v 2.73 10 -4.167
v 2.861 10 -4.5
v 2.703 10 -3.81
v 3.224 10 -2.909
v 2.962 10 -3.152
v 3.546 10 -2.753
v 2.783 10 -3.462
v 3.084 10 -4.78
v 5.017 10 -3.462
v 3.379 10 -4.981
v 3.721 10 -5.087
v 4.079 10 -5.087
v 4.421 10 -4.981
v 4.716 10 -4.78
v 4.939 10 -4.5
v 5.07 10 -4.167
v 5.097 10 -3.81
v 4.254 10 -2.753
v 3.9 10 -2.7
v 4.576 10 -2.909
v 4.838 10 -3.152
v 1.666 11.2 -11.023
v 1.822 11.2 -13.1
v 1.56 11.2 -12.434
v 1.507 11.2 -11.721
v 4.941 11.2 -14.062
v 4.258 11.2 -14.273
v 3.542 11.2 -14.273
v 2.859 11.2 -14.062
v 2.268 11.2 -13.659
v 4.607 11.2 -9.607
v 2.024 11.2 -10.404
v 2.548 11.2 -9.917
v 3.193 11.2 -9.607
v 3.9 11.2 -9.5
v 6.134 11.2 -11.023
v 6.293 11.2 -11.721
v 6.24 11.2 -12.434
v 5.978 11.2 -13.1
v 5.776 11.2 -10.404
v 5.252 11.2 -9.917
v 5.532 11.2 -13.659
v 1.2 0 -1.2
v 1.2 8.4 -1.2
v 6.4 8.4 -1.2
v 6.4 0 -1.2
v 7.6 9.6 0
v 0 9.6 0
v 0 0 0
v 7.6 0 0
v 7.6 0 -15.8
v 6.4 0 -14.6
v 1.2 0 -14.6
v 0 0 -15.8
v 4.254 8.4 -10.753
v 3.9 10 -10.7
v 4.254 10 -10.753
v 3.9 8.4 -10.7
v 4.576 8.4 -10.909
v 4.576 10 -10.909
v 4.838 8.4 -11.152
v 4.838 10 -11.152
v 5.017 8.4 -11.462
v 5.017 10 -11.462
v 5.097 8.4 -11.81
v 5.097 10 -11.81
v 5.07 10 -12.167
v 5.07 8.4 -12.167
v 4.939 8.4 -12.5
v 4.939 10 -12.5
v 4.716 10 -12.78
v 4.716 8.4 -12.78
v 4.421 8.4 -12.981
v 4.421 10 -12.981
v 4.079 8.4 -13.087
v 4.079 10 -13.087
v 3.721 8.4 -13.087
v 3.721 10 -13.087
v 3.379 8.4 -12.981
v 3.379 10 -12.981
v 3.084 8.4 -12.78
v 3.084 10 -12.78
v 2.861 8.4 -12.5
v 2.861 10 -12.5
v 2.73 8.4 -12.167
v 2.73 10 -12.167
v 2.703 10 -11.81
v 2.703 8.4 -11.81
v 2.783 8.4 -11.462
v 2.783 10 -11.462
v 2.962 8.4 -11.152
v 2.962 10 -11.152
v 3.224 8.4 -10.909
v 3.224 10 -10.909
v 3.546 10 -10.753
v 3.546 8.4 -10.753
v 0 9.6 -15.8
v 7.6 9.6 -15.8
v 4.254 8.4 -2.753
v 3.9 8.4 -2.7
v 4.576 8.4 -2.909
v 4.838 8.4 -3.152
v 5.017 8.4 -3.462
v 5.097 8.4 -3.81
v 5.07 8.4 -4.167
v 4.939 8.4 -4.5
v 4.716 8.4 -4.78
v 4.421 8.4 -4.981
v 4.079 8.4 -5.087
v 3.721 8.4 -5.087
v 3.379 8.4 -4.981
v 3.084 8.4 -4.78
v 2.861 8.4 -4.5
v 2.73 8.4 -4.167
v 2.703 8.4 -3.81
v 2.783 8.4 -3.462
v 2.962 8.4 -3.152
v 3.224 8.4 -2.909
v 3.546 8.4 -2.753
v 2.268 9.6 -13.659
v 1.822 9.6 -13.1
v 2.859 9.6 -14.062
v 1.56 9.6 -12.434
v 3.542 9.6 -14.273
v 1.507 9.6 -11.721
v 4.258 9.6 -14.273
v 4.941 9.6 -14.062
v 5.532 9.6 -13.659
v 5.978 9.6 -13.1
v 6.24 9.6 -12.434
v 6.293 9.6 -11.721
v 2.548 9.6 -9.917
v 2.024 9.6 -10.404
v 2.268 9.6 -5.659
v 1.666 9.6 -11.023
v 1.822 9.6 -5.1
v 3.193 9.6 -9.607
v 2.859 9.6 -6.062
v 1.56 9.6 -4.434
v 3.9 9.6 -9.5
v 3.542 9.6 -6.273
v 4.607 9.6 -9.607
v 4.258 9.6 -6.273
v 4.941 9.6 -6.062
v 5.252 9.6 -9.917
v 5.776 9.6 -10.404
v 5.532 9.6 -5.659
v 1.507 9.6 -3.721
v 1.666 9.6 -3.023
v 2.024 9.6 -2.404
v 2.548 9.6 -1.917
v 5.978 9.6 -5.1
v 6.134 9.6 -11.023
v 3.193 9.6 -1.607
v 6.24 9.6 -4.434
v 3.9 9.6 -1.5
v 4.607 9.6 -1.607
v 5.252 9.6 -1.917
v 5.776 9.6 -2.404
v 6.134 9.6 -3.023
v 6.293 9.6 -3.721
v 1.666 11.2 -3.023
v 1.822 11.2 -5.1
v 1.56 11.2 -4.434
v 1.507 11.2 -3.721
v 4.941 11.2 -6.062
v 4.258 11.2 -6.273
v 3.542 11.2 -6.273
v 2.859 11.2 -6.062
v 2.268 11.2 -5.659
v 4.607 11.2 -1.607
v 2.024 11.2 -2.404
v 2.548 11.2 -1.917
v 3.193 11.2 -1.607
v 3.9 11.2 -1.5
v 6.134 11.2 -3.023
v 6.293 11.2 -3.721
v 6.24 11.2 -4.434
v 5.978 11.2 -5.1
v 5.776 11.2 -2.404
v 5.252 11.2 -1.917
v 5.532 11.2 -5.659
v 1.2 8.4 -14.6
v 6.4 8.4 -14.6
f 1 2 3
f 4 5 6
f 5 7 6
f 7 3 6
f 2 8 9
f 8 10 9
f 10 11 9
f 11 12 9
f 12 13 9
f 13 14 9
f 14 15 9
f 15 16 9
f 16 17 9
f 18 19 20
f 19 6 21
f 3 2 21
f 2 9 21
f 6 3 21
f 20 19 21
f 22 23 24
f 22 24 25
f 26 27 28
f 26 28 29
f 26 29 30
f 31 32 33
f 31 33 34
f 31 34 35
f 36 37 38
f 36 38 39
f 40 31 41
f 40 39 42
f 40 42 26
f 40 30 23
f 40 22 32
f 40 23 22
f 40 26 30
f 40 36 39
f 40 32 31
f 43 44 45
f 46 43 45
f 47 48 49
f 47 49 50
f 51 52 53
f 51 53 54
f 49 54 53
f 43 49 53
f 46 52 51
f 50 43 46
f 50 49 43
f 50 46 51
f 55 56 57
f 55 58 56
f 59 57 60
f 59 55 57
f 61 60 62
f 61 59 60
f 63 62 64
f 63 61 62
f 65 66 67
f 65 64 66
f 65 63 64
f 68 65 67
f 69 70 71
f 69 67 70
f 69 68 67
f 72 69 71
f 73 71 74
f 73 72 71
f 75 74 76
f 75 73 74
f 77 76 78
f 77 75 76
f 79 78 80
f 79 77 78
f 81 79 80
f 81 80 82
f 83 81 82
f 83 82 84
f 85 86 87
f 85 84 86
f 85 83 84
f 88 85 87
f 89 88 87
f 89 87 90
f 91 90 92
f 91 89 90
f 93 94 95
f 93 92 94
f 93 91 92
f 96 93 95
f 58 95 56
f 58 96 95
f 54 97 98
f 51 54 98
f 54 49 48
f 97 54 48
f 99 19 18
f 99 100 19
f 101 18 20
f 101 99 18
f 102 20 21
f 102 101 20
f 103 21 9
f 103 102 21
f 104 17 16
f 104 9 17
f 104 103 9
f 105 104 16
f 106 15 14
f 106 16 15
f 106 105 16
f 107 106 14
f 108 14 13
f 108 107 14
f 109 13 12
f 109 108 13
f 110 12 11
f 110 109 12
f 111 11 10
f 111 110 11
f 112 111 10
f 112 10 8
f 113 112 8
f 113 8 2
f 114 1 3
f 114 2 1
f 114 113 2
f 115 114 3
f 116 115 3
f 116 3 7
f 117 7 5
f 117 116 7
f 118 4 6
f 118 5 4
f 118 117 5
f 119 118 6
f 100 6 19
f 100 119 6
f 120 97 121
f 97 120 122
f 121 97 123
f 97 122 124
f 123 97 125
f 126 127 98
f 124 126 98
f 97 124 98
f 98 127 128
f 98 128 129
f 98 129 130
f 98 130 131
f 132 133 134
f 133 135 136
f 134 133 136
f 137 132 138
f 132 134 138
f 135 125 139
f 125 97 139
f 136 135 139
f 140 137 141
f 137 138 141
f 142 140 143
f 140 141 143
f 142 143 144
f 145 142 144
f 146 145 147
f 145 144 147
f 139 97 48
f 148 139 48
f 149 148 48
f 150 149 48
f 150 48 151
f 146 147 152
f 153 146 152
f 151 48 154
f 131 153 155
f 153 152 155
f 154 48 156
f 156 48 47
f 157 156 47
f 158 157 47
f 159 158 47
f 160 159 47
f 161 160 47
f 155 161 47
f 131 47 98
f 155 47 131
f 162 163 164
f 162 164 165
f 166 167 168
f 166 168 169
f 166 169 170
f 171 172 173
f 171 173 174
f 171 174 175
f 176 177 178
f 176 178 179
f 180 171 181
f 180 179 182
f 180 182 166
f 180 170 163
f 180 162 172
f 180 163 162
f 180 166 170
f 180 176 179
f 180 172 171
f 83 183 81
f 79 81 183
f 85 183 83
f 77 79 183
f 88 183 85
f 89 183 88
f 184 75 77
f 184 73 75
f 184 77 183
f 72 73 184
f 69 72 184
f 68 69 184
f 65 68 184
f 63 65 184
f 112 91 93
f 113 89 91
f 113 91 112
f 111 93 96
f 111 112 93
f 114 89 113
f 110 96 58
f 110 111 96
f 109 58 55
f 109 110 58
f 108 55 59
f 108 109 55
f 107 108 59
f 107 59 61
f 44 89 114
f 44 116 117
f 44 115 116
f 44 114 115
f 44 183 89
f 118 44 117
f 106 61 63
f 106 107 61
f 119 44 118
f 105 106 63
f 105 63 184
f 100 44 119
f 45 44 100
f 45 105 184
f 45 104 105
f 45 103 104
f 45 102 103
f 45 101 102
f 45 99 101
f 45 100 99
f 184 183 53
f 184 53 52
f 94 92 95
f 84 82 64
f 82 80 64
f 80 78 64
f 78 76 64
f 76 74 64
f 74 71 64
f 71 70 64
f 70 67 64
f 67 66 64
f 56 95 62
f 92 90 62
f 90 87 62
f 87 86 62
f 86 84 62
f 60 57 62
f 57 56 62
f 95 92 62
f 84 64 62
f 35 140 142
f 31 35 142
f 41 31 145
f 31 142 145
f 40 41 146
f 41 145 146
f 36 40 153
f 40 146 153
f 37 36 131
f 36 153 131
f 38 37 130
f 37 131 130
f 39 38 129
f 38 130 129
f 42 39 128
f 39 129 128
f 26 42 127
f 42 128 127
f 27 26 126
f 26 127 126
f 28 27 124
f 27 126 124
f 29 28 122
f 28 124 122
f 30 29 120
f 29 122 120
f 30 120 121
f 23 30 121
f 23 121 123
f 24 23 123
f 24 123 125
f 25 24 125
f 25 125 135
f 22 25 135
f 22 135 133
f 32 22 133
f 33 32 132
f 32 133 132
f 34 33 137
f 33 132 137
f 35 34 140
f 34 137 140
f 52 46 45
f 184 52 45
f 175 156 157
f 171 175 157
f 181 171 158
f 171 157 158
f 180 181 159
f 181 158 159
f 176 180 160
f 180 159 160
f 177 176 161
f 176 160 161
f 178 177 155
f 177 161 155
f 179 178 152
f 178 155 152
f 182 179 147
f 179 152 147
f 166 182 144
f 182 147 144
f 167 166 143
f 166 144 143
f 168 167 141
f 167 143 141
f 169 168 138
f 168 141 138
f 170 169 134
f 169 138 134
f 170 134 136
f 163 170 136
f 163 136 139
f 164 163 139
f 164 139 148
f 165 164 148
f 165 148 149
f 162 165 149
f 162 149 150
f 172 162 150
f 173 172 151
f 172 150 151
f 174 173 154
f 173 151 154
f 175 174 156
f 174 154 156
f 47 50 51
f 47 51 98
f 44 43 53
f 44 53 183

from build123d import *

# Parameters (mm, degrees)
SKETCH1_W            = 7.6
SKETCH1_H            = 9.6
BOSS_EXTRUDE1_DEPTH  = 15.8
SKETCH2_R            = 2.4
BOSS_EXTRUDE2_DEPTH  = 1.6
LPATTERN1_COUNT      = 2
LPATTERN1_PITCH      = 8
LPATTERN1_COUNT_DIR2 = 4
LPATTERN1_PITCH_DIR2 = 8
SHELL1_T             = -1.2


with BuildPart() as part:
    # Sketch1 → Boss-Extrude1 (new body)
    with BuildSketch(Plane.XY):
        with Locations((3.8, 4.8)):
            Rectangle(SKETCH1_W, SKETCH1_H)
    extrude(amount=-BOSS_EXTRUDE1_DEPTH)

    # Sketch2 → Boss-Extrude2 (add)
    with BuildSketch(Plane(origin=(0, 9.6, 0), x_dir=(1, 0, 0), z_dir=(0, 1, 0))):
        with Locations(Location((3.9, 3.9, 0), (0, 0, 270))):
            Circle(SKETCH2_R)
    boss_extrude2 = extrude(amount=BOSS_EXTRUDE2_DEPTH)

    # LPattern1: Boss-Extrude2 2 × 4, 6 skipped
    with Locations(*[(-j * LPATTERN1_PITCH_DIR2, 0, -i * LPATTERN1_PITCH) for i in range(LPATTERN1_COUNT) for j in range(LPATTERN1_COUNT_DIR2) if (i, j) not in ((0, 0), (0, 1), (0, 2), (0, 3), (1, 1), (1, 2), (1, 3))]):
        add(boss_extrude2)

    # Shell1
    shell1_openings = [part.faces().sort_by_distance(p)[0] for p in [
        (3.8, 0, -7.9),
    ]]
    offset(amount=SHELL1_T, openings=shell1_openings, kind=Kind.INTERSECTION)


solid = part.part
